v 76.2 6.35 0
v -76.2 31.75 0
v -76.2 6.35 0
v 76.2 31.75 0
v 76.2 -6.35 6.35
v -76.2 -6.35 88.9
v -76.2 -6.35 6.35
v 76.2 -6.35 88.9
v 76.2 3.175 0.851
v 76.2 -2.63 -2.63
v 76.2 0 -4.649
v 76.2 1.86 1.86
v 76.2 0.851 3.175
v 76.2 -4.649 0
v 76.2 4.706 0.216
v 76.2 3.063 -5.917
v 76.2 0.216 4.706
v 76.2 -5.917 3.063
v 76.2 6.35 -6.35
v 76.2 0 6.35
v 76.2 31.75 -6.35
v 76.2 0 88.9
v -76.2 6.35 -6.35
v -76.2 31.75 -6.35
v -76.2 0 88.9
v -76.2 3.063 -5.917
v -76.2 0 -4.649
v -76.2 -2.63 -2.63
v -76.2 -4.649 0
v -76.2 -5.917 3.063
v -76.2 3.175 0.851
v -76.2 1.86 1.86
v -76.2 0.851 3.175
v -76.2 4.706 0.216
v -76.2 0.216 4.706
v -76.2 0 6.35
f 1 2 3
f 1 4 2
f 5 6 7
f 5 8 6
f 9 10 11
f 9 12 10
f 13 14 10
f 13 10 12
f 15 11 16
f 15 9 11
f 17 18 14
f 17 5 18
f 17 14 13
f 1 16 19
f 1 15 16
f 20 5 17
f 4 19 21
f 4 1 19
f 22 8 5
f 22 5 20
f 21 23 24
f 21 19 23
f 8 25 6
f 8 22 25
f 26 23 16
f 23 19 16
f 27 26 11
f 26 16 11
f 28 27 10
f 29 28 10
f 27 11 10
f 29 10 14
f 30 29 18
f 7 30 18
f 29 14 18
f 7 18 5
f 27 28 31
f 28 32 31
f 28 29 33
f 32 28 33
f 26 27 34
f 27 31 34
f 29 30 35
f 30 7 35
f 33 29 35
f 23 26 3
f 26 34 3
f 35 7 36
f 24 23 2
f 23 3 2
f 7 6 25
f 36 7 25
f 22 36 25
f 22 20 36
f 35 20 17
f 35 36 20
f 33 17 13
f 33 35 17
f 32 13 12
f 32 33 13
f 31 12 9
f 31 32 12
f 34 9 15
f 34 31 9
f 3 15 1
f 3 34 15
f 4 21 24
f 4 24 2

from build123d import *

# Parameters (mm, degrees)
F1_DEPTH = 76.2
F2_R     = 6.35
F3_R     = 12.7


with BuildPart() as f1:
    # F0 (on Right) → F1 (new body, symmetric)
    with BuildSketch(Plane.YZ):
        Polygon((-6.35, 88.9), (-6.35, -6.35), (31.75, -6.35), (31.75, 0), (0, 0), (0, 88.9), align=None)
    extrude(amount=F1_DEPTH, both=True)

    # F2
    f2_edges = [f1.edges().sort_by_distance(p)[0] for p in [
        (0, 0, 0),
    ]]
    fillet(f2_edges, radius=F2_R)

    # F3
    f3_edges = [f1.edges().sort_by_distance(p)[0] for p in [
        (0, -6.35, -6.35),
    ]]
    fillet(f3_edges, radius=F3_R)


solid = f1.part
